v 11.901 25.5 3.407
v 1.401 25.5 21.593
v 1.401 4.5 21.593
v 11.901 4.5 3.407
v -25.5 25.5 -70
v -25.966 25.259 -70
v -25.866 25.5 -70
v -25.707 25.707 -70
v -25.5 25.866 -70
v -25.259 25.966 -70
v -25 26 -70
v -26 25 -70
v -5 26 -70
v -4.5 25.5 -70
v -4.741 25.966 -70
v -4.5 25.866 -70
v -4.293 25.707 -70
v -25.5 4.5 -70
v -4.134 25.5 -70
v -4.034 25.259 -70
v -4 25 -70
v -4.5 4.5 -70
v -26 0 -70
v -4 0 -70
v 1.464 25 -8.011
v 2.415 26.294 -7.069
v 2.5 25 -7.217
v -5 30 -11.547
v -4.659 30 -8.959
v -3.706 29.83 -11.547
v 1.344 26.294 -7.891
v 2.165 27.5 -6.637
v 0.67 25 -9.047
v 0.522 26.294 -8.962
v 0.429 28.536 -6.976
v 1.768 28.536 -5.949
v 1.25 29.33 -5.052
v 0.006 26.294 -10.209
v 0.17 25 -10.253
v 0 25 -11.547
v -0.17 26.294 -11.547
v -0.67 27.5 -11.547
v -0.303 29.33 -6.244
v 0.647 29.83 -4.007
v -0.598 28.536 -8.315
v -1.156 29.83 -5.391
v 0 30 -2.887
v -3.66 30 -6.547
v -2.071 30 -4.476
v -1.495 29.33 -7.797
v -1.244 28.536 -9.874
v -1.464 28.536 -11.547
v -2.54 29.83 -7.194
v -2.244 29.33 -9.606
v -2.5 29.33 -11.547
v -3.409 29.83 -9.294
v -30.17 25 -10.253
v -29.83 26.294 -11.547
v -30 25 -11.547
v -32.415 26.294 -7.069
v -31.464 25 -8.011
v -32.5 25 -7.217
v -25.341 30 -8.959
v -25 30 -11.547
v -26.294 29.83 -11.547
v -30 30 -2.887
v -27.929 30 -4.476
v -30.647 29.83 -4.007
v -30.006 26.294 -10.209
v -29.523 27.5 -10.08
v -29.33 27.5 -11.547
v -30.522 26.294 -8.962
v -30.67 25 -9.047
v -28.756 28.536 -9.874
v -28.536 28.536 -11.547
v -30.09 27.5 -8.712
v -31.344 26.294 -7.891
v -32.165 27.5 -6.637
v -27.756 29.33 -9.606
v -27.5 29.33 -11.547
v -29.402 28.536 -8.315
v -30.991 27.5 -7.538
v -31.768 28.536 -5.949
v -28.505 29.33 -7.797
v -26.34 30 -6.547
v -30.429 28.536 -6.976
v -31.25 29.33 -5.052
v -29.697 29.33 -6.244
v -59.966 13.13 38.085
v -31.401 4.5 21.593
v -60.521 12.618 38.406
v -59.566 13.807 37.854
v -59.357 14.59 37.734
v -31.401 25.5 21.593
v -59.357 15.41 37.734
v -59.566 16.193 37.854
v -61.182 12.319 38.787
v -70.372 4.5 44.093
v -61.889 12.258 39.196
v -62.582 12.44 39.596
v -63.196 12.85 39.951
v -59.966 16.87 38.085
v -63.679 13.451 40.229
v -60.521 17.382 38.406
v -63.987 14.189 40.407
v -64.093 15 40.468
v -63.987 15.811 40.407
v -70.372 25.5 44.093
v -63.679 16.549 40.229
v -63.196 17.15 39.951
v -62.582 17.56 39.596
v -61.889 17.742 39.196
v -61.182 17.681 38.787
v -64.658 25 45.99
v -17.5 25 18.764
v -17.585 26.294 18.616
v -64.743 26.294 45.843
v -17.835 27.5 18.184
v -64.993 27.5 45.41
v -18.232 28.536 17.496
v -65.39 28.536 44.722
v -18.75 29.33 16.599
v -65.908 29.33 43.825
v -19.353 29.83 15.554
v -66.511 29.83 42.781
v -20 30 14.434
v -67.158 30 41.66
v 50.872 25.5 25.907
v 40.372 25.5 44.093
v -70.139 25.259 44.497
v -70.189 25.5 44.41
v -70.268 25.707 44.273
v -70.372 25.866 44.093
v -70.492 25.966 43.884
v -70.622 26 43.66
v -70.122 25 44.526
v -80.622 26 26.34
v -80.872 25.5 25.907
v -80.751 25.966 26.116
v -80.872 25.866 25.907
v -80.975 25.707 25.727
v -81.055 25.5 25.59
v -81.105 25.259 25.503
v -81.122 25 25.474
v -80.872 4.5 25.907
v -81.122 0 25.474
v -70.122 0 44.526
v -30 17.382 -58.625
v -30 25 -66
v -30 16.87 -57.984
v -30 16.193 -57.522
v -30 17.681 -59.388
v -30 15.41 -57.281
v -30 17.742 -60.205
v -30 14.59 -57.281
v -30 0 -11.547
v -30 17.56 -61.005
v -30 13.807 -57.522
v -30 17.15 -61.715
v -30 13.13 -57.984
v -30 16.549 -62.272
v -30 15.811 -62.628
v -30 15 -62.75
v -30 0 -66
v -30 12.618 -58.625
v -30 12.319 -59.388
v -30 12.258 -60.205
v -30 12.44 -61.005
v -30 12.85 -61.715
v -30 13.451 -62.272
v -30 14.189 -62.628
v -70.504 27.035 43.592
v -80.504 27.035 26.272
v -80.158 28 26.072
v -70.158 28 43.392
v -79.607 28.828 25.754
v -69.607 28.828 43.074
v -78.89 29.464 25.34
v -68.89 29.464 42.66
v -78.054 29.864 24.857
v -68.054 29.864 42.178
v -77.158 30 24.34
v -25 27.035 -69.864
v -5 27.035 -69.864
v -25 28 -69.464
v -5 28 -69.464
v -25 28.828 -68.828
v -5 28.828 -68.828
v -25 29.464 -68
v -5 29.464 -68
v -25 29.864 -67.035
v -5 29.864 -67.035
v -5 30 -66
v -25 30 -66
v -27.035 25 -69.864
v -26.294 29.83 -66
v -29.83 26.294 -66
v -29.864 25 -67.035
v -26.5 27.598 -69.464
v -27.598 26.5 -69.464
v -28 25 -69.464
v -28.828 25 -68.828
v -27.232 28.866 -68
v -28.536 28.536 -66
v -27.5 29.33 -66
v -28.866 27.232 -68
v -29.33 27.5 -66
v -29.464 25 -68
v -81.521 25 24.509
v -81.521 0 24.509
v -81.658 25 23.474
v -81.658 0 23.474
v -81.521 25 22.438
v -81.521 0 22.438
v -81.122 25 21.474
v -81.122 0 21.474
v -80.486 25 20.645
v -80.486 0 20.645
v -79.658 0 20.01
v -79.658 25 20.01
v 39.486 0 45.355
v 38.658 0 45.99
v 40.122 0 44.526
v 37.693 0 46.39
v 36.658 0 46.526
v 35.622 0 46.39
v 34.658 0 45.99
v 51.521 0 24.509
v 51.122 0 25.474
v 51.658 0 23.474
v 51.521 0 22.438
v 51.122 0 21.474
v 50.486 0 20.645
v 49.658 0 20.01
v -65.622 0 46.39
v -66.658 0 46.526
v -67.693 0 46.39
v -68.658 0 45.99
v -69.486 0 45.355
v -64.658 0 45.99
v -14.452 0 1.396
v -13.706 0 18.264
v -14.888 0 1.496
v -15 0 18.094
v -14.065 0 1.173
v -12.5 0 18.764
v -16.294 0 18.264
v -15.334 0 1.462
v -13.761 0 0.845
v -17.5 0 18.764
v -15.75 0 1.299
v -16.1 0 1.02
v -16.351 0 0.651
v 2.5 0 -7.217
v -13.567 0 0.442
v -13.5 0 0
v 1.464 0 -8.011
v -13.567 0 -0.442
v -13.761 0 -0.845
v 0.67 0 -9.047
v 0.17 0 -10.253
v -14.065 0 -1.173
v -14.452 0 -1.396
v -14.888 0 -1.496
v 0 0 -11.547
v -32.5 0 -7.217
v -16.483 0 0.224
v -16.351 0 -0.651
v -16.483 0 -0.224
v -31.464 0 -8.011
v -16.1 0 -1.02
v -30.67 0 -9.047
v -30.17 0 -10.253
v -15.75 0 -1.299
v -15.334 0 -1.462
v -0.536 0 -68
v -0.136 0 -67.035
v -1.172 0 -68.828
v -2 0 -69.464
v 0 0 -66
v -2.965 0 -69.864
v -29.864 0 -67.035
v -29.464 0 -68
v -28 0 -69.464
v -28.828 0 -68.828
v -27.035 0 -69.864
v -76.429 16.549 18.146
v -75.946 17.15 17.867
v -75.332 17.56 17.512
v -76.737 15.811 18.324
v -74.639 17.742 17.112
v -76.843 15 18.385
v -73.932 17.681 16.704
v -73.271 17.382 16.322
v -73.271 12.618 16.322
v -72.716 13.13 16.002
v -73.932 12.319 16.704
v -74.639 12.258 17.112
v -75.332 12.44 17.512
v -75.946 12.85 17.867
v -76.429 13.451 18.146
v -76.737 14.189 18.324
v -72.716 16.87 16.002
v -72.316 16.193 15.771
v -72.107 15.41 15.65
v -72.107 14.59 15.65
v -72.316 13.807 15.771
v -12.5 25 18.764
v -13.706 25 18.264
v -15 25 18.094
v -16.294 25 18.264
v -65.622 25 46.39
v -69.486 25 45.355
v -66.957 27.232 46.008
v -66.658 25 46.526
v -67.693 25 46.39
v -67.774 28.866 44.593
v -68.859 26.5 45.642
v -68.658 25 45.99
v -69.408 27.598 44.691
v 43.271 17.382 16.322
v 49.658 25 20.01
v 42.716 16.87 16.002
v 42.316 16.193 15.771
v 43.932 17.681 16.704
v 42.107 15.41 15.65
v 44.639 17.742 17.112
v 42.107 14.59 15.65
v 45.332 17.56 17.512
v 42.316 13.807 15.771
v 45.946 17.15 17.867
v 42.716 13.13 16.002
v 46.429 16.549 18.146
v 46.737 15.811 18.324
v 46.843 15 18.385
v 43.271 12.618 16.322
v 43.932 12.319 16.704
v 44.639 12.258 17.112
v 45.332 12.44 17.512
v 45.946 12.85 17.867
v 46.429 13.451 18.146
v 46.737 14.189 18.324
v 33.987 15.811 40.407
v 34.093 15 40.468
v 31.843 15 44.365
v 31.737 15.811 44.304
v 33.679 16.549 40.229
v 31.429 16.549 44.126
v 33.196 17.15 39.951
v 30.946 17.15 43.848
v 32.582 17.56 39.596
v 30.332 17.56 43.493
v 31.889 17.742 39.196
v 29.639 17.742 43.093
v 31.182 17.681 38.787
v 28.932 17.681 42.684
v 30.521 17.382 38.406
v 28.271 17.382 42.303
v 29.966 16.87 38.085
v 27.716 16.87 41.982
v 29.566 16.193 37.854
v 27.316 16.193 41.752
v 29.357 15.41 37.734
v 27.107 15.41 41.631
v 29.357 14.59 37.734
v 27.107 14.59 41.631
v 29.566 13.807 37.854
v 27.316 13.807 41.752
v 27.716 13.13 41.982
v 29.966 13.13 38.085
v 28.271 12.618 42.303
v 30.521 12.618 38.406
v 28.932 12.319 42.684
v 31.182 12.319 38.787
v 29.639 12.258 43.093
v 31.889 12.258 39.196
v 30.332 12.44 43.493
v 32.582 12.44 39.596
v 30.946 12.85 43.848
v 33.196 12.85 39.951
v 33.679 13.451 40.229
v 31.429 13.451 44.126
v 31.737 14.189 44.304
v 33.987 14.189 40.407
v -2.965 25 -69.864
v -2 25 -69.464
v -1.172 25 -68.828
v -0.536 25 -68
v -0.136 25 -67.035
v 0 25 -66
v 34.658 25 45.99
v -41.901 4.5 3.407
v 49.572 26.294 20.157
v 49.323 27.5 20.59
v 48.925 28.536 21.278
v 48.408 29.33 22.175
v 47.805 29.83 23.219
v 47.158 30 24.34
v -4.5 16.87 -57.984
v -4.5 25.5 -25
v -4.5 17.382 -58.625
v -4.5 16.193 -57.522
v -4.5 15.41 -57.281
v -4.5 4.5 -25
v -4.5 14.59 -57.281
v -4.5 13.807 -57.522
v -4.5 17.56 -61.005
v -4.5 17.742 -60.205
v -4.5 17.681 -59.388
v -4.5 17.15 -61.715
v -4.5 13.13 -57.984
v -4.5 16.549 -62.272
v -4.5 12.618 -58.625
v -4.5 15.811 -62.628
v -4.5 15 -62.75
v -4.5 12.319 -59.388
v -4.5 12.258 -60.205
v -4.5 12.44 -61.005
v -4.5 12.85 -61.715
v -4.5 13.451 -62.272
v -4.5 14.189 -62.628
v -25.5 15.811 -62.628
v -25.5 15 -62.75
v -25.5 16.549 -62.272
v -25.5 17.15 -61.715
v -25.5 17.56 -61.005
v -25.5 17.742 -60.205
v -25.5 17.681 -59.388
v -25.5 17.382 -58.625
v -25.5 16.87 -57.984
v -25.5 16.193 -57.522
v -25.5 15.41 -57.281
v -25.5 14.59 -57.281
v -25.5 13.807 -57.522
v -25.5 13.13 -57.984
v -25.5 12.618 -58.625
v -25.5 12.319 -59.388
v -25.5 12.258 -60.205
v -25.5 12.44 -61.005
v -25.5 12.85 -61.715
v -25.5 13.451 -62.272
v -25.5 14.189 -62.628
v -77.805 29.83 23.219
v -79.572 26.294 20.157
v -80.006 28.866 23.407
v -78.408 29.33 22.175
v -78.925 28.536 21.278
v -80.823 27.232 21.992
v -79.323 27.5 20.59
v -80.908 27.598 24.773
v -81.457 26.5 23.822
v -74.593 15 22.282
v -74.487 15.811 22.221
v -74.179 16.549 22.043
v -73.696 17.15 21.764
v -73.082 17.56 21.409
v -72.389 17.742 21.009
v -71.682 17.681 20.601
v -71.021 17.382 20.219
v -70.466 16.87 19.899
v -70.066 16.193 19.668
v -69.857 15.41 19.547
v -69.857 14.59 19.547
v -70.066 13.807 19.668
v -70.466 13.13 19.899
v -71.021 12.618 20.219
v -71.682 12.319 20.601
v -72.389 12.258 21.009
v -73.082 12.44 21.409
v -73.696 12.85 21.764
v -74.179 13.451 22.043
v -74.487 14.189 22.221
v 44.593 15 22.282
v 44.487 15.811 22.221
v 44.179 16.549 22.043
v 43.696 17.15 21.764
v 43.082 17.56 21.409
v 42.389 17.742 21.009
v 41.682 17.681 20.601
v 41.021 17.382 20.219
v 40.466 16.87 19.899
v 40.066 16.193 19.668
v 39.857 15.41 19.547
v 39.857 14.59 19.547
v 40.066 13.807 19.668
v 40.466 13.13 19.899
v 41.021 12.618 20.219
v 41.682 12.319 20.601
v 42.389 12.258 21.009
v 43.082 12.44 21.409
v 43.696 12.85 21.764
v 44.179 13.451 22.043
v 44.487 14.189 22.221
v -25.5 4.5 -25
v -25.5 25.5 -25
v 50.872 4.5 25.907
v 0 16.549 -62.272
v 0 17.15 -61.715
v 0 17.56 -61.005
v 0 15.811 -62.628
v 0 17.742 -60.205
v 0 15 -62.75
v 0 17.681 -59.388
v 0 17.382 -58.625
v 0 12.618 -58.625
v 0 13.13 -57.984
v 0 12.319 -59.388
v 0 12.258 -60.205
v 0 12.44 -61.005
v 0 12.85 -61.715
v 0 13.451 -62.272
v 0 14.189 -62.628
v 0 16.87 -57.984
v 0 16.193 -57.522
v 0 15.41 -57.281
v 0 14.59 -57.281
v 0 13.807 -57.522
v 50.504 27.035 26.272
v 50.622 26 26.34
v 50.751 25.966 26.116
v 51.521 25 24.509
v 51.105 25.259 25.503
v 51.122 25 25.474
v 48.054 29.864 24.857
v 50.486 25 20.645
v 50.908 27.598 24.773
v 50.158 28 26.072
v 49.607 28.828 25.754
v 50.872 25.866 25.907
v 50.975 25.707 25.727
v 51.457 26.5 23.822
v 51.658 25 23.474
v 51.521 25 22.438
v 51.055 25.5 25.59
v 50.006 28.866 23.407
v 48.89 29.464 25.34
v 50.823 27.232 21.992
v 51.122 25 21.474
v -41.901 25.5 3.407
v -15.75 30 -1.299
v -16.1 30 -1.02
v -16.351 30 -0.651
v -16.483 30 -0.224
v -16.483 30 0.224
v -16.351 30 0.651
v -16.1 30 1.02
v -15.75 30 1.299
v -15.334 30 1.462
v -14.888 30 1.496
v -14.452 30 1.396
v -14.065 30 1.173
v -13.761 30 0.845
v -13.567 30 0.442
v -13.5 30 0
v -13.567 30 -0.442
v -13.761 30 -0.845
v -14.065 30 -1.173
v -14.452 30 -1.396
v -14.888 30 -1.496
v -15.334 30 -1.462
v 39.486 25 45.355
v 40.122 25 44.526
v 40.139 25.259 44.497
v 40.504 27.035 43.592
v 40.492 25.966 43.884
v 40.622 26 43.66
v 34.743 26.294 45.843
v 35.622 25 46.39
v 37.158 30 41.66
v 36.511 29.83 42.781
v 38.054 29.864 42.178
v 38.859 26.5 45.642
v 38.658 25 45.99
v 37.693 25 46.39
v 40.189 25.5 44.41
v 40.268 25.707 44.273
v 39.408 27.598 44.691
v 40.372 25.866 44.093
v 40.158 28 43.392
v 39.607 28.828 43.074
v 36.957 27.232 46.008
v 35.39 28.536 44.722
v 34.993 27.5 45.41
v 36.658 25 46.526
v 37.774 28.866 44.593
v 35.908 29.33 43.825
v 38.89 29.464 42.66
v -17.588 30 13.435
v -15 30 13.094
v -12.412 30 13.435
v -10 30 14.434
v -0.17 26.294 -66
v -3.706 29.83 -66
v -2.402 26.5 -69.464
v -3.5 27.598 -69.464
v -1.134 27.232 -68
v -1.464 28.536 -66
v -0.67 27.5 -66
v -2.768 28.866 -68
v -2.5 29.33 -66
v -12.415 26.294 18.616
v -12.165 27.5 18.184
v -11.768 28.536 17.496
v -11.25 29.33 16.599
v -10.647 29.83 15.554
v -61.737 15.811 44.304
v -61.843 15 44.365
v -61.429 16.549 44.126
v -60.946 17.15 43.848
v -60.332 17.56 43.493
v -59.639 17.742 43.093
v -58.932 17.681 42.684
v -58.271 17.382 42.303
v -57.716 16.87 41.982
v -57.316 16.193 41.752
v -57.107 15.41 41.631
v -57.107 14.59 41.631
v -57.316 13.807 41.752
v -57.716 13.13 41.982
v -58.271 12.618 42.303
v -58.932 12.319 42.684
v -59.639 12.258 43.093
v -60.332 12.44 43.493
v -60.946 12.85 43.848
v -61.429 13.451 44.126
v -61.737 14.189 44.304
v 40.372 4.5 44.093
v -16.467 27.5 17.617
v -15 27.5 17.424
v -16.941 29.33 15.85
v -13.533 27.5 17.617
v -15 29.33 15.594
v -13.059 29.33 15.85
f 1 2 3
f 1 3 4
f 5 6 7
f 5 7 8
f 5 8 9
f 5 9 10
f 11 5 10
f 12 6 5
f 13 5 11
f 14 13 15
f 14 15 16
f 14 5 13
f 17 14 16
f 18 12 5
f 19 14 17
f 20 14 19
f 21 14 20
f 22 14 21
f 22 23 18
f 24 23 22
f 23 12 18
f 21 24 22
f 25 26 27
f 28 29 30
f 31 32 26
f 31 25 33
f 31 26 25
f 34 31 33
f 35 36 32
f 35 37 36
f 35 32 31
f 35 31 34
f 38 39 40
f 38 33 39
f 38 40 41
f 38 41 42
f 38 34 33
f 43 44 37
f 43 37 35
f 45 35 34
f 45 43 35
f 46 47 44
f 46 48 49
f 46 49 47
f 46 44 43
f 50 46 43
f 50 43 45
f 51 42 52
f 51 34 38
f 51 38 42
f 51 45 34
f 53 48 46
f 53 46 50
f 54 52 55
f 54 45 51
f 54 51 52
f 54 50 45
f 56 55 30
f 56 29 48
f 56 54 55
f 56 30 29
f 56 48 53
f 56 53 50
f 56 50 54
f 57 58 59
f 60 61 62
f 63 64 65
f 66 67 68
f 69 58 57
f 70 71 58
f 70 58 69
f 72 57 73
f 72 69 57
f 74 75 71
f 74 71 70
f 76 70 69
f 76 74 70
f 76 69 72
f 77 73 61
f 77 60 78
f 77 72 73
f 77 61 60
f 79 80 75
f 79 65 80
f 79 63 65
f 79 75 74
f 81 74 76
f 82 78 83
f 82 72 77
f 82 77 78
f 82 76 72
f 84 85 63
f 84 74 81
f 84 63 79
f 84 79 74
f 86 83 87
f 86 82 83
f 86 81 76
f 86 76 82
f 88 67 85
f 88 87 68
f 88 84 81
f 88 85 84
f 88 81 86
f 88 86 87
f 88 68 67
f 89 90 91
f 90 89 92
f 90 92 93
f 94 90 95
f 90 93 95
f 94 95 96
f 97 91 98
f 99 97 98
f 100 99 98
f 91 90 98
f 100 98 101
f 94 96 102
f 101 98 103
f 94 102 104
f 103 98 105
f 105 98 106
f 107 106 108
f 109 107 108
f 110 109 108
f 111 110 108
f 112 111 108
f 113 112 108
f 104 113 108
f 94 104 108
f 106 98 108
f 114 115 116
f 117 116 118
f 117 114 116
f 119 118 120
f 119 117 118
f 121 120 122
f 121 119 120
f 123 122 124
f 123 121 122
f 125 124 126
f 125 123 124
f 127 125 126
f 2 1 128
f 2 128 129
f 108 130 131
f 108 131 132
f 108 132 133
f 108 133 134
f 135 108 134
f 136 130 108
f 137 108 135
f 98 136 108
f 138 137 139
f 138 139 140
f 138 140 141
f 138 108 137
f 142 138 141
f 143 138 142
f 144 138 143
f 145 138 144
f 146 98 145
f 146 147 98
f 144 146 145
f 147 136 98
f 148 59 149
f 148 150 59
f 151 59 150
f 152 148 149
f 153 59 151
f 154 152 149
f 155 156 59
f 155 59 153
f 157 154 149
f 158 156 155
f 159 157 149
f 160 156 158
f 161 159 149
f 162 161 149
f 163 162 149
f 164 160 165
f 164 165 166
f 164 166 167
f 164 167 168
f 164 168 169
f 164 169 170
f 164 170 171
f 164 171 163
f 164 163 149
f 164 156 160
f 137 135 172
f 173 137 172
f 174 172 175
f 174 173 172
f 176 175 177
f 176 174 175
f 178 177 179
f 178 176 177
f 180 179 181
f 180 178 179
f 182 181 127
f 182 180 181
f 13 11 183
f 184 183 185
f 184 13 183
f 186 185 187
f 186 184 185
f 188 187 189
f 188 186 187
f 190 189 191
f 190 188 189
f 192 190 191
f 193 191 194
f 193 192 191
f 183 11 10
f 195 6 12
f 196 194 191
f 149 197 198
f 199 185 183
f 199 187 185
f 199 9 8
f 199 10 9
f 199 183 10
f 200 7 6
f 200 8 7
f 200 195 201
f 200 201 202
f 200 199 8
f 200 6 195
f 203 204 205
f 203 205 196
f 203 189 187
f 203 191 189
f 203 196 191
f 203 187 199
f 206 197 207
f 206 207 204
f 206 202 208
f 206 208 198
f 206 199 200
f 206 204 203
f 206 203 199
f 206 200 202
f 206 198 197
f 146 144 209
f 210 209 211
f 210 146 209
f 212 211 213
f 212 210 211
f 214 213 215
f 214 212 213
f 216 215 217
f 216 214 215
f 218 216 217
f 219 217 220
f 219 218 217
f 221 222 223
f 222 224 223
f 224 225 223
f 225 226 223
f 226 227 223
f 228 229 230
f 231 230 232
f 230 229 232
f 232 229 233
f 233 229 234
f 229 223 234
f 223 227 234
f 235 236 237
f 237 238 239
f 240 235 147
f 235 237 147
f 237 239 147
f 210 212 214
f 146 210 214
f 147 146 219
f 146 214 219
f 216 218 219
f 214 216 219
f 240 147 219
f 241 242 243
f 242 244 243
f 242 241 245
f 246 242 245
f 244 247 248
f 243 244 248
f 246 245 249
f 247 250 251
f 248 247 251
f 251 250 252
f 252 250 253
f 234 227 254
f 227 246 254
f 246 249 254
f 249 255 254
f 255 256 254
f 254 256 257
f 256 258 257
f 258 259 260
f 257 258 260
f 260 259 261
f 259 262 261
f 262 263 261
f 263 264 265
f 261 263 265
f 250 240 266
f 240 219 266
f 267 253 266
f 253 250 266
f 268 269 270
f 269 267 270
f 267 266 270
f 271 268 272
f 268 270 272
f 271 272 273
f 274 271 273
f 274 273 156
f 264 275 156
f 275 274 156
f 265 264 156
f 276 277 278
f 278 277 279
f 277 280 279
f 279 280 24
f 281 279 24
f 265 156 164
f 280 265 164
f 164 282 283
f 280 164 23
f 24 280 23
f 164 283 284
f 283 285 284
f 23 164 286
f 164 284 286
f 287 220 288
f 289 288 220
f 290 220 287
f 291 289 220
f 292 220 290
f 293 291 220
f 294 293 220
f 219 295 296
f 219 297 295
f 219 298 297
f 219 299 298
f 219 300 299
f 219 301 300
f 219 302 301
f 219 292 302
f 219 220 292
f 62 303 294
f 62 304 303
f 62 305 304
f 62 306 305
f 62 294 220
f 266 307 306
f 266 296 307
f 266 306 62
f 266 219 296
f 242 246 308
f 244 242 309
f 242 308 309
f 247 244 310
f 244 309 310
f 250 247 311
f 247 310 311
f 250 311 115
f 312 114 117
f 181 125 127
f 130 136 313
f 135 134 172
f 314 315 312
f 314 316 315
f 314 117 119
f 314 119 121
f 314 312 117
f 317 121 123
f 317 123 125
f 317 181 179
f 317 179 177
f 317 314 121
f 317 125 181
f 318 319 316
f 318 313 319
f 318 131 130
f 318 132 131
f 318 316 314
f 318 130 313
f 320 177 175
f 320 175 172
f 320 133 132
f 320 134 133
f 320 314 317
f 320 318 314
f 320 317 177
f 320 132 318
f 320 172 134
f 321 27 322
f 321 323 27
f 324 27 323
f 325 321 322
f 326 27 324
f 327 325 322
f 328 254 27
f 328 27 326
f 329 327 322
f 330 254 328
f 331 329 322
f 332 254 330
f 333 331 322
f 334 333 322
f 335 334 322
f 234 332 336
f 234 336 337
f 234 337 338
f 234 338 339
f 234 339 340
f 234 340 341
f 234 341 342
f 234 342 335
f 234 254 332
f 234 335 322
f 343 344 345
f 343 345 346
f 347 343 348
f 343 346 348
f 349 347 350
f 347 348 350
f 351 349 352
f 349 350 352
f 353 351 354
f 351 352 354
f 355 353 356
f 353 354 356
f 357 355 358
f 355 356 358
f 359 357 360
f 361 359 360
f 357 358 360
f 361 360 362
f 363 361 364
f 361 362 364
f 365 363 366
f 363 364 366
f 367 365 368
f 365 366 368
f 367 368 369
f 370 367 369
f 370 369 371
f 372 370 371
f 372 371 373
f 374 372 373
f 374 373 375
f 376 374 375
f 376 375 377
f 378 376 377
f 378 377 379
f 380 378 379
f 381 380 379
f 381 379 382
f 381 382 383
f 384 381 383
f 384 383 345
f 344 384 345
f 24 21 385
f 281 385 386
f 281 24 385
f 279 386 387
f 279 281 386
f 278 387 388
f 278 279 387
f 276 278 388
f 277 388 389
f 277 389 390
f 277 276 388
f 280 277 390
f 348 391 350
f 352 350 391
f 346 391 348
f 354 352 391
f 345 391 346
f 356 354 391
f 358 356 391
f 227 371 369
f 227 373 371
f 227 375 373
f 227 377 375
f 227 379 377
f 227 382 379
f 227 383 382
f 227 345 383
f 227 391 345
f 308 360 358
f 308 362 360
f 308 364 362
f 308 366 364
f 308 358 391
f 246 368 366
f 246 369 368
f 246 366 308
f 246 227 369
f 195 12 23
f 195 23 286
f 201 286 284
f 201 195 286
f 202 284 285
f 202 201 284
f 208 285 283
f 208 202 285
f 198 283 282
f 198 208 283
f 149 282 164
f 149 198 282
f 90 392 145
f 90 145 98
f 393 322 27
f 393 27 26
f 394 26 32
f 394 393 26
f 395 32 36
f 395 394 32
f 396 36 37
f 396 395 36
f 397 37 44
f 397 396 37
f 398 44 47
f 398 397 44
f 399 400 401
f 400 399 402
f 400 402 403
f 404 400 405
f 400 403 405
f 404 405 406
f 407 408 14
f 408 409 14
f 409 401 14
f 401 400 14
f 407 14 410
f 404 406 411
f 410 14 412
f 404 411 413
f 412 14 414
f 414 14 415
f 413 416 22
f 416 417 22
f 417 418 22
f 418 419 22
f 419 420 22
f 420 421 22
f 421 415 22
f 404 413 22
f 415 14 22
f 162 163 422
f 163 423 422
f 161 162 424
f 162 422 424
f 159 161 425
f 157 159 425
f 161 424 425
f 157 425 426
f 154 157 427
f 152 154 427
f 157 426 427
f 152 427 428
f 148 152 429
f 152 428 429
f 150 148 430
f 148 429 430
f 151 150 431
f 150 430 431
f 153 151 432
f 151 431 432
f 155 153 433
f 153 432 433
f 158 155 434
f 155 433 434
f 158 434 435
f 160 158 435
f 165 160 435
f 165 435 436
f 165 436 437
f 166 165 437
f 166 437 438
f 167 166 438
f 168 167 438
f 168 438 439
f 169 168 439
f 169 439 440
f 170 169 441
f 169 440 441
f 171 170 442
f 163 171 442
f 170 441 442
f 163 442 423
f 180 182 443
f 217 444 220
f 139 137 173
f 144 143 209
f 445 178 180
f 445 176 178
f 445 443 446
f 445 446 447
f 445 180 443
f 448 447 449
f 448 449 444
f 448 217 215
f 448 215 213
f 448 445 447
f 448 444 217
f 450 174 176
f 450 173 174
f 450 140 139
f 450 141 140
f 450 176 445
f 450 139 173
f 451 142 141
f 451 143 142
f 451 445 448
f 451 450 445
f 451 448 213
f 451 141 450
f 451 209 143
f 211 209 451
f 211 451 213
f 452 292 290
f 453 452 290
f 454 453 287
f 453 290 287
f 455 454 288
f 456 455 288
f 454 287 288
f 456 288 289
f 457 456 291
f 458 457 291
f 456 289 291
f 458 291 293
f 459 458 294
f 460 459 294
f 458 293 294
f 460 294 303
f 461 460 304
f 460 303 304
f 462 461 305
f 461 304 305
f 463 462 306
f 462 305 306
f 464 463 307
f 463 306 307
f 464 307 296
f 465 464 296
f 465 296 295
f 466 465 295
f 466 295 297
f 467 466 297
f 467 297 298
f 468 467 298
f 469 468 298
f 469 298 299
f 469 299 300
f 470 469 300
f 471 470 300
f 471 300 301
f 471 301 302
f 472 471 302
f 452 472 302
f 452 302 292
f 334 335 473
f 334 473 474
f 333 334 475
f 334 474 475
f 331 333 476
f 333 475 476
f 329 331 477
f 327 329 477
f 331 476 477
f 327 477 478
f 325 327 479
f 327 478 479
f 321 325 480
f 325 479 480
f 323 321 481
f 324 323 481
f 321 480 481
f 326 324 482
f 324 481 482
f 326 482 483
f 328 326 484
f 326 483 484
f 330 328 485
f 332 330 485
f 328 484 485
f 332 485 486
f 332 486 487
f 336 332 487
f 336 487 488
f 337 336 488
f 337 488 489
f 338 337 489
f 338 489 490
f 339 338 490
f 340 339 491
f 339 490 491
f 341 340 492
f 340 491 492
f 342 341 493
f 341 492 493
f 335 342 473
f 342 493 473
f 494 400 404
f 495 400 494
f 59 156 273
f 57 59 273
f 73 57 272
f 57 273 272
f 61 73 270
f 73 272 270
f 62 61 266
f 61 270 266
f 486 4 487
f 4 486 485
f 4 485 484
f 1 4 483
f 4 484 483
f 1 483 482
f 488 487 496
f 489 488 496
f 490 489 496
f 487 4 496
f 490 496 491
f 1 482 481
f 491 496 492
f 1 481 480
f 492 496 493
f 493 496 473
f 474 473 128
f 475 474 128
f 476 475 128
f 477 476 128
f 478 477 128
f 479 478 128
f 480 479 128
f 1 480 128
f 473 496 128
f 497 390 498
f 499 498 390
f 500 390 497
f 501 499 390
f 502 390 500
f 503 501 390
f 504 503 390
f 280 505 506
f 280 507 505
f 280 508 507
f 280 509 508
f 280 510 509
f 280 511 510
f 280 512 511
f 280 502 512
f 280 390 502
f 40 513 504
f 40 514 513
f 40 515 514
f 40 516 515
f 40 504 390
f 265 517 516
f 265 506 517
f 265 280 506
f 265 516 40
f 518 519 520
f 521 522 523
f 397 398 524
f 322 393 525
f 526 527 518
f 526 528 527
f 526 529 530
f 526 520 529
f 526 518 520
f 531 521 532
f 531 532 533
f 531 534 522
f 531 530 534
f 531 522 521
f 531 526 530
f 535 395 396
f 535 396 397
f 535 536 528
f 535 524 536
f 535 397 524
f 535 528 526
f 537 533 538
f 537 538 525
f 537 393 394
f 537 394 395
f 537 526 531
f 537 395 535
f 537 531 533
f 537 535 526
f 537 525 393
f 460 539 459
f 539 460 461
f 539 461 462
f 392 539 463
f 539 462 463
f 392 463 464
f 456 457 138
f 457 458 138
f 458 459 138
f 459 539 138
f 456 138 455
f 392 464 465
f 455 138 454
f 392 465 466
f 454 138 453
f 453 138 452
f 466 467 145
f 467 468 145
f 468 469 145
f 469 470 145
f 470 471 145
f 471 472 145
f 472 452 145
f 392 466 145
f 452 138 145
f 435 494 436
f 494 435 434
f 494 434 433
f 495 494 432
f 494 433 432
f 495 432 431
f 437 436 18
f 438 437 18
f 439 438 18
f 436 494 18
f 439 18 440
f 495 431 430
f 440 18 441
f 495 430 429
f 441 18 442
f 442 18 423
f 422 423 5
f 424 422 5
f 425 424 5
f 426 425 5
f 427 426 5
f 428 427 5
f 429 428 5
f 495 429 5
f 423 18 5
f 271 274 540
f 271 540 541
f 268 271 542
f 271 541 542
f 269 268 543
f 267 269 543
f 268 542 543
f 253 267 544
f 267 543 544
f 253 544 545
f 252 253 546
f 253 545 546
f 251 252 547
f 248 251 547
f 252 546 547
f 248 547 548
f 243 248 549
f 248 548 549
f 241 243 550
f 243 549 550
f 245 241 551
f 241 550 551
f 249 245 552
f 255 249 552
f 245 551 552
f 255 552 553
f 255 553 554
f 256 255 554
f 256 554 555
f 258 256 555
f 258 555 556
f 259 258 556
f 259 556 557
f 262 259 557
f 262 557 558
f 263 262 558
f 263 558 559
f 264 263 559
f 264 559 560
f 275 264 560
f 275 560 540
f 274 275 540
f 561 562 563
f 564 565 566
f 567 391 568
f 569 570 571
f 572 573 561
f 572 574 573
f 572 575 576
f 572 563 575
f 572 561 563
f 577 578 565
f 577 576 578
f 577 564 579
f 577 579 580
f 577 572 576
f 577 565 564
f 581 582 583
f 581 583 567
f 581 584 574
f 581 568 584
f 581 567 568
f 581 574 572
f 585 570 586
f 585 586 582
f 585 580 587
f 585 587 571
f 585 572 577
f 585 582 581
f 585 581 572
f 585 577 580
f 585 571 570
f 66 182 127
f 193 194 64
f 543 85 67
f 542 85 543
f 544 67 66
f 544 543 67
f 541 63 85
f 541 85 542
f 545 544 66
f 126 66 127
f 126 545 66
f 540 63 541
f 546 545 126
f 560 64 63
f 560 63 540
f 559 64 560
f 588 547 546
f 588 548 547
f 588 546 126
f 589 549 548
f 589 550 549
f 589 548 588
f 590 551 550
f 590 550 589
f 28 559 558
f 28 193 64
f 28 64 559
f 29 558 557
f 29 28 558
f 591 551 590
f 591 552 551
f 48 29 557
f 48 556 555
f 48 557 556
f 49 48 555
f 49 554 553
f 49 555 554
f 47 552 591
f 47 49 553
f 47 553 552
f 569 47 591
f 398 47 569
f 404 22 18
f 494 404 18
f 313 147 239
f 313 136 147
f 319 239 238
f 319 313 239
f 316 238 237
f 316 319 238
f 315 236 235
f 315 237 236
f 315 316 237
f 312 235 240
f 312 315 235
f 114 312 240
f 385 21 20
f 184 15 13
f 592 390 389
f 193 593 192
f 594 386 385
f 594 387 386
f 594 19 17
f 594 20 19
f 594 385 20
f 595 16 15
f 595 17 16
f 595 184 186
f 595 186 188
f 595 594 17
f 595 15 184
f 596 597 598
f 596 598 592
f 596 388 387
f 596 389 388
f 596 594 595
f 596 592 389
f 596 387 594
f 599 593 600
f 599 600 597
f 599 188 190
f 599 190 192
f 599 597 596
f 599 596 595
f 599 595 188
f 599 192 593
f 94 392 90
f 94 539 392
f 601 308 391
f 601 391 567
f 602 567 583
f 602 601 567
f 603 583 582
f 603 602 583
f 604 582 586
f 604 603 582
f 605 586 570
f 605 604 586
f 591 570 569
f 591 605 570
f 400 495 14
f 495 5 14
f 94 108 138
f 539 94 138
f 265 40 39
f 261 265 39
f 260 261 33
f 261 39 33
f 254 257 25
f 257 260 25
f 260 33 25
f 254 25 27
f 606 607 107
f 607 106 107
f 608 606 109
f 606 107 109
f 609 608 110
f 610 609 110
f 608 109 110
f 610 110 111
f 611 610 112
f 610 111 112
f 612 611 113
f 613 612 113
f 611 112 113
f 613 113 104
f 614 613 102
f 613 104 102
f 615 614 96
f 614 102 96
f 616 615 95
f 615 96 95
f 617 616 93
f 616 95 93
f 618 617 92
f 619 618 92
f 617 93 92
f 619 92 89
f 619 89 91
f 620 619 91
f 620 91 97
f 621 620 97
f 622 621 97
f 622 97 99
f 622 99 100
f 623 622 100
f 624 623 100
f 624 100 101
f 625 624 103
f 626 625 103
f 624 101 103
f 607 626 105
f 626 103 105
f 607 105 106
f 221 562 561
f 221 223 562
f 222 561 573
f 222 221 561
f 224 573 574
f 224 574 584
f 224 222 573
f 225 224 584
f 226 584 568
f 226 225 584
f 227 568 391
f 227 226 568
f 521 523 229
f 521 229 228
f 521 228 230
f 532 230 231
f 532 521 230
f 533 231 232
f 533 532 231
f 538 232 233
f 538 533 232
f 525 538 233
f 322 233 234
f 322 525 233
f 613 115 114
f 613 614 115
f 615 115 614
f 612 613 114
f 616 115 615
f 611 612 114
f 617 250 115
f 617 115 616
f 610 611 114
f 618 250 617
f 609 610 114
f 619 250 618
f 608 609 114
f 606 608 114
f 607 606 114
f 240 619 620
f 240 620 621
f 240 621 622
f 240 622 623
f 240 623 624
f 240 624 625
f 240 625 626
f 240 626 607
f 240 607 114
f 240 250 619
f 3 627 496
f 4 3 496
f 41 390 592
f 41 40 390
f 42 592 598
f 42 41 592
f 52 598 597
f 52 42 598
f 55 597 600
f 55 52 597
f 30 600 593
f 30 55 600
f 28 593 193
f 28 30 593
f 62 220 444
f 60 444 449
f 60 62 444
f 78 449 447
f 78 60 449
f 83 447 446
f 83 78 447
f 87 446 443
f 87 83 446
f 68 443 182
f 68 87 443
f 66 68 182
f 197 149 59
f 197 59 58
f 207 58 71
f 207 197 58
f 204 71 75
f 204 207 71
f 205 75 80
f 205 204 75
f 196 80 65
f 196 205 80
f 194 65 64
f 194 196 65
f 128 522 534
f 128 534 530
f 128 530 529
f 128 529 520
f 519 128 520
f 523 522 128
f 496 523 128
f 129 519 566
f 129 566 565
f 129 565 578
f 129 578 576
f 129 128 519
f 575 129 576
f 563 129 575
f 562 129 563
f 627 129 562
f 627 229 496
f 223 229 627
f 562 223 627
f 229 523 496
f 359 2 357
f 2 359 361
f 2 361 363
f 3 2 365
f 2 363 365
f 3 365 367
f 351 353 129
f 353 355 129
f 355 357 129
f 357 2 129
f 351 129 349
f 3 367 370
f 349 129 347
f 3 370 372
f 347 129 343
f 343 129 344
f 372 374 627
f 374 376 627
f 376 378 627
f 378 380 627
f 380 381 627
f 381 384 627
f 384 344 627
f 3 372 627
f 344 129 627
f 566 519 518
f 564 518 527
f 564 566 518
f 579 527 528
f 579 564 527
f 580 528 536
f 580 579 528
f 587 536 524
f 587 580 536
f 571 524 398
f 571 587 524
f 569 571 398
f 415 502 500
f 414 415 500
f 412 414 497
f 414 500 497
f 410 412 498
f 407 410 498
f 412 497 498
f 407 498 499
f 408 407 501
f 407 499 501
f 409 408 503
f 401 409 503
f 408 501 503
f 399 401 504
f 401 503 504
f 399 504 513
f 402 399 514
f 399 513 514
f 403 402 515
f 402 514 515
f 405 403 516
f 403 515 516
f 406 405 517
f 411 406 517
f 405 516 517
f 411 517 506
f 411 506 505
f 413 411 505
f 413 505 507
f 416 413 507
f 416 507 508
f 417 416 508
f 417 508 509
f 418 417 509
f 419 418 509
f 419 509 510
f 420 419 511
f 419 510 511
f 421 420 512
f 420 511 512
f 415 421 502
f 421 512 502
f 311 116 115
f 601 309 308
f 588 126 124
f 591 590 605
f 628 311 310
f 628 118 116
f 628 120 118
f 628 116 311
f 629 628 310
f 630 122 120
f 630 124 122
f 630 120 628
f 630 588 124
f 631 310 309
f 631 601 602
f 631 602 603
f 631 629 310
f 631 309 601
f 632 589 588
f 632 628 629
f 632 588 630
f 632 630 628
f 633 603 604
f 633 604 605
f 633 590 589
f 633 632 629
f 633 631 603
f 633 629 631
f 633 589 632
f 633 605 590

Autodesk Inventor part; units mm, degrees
ref_plane "YZ Plane" through (0, 0, 0) normal (1, 0, 0) x (0, 1, 0)
ref_plane "XZ Plane" through (0, 0, 0) normal (0, 1, 0) x (-1, 0, 0)
ref_plane "XY Plane" through (0, 0, 0) normal (0, 0, 1) x (1, 0, 0)
sketch "Sketch1" plane through (0, 0, 0) normal (0, 1, 0) x (-1, 0, 0)
  line L0 (0, 0) -> (30, 0)
  line L1 (30, 0) -> (30, -70)
  line L2 (30, -70) -> (0, -70)
  line L3 (0, -70) -> (0, 0)
  dimension "d0" = 30
  dimension "d1" = 70
extrude "Extrusion1" add sketch "Sketch1" along normal blind 30
sketch "Sketch6" plane through (0, 30, 0) normal (0, 1, 0) x (1, 0, 0)
  line L0 (0, 0) -> (-15, 0)
  line L1 (-30, 0) -> (0, 0) projected
  circle A0 centre (-15, 0) radius 1.5
  dimension "d32" = 3
extrude "Extrusion6" cut sketch "Sketch6" against normal blind 30
pattern_circular "Circular Pattern4" count 3 over 360 about axis through (-15, 30, 0) along (0, -1, 0) of "Extrusion1", "Extrusion6"
sketch "Sketch7" plane through (0, 0, -70) normal (0, 0, -1) x (-1, 0, 0)
  line L0 (4.5, 4.5) -> (25.5, 4.5)
  line L1 (25.5, 4.5) -> (25.5, 25.5)
  line L2 (25.5, 25.5) -> (4.5, 25.5)
  line L3 (4.5, 25.5) -> (4.5, 4.5)
  line L4 (15, 30) -> (15, 0) projected
  line L5 (4.5, 4.5) -> (25.5, 25.5) construction
  line L6 (25.5, 4.5) -> (4.5, 25.5) construction
  point P0 (0, 0)
  point P1 (15, 15)
  dimension "d38" = 21
  dimension "d39" = 21
extrude "Extrusion7" cut sketch "Sketch7" against normal blind 45
pattern_circular "Circular Pattern5" count 3 over 360 about axis through (-15, 30, 0) along (0, -1, 0) of "Extrusion7"
sketch "Sketch8" plane through (-15, 0, 17.3205) normal (-0.5, 0, 0.866) x (0.866, 0, 0.5)
  line L0 (61.3397, 0) -> (61.3397, 30) projected
  line L1 (61.3397, 15) -> (51.3397, 15)
  circle A0 centre (51.3397, 15) radius 2.75
  point P0 (4.3301, 0)
  dimension "d45" = 10
  dimension "d46" = 5.5
extrude "Extrusion8" cut sketch "Sketch8" against normal blind 30
pattern_circular "Circular Pattern6" count 3 over 360 about axis through (-15, 30, 0) along (0, -1, 0) of "Extrusion8"
fillet "Fillet5" radius 5 3 edges at (-15, 15, 17.3205) (0, 15, -8.6603) (-30, 15, -8.6603)
fillet "Fillet6" radius 5 6 edges at (-30, 30, -40.7735) (-57.8109, 30, 7.3964) (12.8109, 30, 33.3771) (-42.8109, 30, 33.3771) (27.8109, 30, 7.3964) (0, 30, -40.7735)
fillet "Fillet7" radius 4 15 edges at (-28.5355, 28.5355, -70) (-30, 12.5, -70) (-1.4645, 28.5355, -70) (0, 12.5, -70) (-15, 30, -70) (-68.854, 28.5355, 46.7221) (-68.1218, 12.5, 47.9904) (-82.3895, 28.5355, 23.2779) (-83.1218, 12.5, 22.0096) (-75.6218, 30, 35) (52.3895, 28.5355, 23.2779) (53.1218, 12.5, 22.0096) (38.854, 28.5355, 46.7221) (38.1218, 12.5, 47.9904) (45.6218, 30, 35)
properties part number "80_20_bot_connector"
